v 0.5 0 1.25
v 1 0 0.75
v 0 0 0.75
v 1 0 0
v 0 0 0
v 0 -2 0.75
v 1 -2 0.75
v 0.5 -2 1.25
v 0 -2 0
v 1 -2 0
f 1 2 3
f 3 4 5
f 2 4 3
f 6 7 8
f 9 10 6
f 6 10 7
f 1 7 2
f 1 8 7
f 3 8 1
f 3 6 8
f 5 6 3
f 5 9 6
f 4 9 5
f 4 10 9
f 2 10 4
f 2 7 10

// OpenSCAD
 module house (size=1, roof_offset=0, length_offset=0, paint=[1,0,0]) {
    color(paint)
    rotate([90,0,0]) 
    linear_extrude(height=(1 * size) + length_offset) 
    polygon(points=[[0 * size,0 * size],
                    [0 * size,0.75 * size],
                    [0.5 * size,(1.25 * size) + roof_offset],
                    [1 * size,0.75 * size],
                    [1 * size,0 * size]]);
    }

house(1,0,1,"lightslategrey");
